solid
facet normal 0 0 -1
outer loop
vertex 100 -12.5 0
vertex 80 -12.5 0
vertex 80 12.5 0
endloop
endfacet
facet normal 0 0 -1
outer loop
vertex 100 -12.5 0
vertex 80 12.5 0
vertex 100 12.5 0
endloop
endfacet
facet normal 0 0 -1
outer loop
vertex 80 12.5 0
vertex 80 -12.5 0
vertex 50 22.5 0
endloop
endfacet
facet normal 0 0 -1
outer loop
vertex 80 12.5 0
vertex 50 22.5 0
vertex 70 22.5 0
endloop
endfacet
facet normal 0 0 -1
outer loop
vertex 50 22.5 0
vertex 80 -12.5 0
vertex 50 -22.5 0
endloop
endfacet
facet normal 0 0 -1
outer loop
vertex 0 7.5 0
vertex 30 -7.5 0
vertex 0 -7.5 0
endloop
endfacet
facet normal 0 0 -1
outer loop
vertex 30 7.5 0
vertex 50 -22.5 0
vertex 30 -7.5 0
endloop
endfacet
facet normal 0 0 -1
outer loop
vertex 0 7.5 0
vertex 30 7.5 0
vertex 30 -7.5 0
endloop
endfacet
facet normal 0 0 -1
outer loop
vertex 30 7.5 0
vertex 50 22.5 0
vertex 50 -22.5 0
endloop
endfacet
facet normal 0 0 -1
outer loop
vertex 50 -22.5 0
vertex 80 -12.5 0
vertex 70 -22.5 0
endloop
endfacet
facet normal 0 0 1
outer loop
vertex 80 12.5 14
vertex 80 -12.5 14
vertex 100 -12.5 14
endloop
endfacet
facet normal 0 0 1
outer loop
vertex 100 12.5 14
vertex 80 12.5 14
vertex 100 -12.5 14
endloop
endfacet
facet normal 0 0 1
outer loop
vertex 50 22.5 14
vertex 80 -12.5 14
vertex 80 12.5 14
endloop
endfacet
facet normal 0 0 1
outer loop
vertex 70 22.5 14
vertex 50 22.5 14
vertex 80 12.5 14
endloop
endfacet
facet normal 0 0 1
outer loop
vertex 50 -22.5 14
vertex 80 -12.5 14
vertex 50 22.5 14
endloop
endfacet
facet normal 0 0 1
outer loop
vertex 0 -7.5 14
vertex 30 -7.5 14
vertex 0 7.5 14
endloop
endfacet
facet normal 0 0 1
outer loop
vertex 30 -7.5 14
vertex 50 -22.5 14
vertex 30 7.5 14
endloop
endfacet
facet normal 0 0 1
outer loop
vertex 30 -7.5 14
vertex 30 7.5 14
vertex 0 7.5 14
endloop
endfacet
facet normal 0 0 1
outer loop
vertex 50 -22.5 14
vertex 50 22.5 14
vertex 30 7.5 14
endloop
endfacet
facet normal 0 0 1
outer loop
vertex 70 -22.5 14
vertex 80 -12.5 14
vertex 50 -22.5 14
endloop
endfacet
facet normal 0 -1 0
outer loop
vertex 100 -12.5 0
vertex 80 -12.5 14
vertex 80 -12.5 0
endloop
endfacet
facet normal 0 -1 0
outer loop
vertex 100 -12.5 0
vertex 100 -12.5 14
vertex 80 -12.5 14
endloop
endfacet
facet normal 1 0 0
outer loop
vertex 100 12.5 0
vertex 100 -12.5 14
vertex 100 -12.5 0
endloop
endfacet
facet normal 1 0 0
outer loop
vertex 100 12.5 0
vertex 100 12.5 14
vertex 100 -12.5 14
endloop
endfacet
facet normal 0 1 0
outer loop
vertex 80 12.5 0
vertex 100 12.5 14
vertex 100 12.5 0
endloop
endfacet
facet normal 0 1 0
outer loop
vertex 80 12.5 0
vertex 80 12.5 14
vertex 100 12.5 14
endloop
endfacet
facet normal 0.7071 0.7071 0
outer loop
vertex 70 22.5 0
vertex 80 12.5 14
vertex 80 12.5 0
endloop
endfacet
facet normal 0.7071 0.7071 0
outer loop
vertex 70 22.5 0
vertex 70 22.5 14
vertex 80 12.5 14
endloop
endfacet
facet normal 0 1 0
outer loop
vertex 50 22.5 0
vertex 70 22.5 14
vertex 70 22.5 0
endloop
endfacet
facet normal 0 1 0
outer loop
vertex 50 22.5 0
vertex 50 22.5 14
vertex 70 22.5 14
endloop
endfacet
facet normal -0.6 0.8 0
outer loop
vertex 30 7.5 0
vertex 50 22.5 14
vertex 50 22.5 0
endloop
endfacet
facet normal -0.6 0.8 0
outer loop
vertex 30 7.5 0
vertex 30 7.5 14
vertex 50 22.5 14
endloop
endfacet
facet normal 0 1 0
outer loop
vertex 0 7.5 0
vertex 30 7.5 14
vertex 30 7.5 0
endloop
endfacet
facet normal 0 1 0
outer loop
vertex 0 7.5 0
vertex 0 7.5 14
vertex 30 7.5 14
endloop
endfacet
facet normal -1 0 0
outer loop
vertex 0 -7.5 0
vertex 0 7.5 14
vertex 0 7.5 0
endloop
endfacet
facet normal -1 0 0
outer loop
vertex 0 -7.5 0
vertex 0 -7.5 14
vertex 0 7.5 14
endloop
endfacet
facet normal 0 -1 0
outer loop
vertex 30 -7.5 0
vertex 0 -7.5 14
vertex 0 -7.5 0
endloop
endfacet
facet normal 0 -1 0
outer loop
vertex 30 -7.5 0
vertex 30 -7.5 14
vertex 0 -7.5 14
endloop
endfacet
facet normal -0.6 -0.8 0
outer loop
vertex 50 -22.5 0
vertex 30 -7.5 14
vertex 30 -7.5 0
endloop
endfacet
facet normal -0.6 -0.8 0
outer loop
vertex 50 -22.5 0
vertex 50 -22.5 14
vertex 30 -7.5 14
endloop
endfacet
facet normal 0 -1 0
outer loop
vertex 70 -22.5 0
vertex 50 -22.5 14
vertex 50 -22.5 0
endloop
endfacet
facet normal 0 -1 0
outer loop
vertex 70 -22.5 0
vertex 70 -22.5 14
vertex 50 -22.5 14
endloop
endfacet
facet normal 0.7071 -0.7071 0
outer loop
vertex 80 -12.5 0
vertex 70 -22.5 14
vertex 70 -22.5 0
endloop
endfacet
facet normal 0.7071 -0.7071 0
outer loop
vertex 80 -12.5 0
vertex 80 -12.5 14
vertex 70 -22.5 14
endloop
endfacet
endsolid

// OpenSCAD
// model parameters
d1=30;
d2=20;
d3=20;
d4=10;
d5=20;

w1=15;
w2=45;
w3=25;

h=14;

// right side points
p0 = [0, w1/2];
p1 = [d1, w1/2];
p2 = [d1 + d2, w2/2];
p3 = [d1 + d2 + d3, w2/2];
p4 = [d1 + d2 + d3 + d4, w3/2];
p5 = [d1 + d2 + d3 + d4 + d5, w3/2];

// left side points
p6 = [d1 + d2 + d3 + d4 + d5, -w3/2];
p7 = [d1 + d2 + d3 + d4, -w3/2];
p8 = [d1 + d2 + d3, -w2/2];
p9 = [d1 + d2, -w2/2];
p10 = [d1, -w1/2];
p11 = [0, -w1/2];

// all points
points = [p0, p1, p2, p3, p4, p5, p6, p7, p8, p9, p10, p11];

// extruded body profile
linear_extrude(height=h)
    polygon(points);
